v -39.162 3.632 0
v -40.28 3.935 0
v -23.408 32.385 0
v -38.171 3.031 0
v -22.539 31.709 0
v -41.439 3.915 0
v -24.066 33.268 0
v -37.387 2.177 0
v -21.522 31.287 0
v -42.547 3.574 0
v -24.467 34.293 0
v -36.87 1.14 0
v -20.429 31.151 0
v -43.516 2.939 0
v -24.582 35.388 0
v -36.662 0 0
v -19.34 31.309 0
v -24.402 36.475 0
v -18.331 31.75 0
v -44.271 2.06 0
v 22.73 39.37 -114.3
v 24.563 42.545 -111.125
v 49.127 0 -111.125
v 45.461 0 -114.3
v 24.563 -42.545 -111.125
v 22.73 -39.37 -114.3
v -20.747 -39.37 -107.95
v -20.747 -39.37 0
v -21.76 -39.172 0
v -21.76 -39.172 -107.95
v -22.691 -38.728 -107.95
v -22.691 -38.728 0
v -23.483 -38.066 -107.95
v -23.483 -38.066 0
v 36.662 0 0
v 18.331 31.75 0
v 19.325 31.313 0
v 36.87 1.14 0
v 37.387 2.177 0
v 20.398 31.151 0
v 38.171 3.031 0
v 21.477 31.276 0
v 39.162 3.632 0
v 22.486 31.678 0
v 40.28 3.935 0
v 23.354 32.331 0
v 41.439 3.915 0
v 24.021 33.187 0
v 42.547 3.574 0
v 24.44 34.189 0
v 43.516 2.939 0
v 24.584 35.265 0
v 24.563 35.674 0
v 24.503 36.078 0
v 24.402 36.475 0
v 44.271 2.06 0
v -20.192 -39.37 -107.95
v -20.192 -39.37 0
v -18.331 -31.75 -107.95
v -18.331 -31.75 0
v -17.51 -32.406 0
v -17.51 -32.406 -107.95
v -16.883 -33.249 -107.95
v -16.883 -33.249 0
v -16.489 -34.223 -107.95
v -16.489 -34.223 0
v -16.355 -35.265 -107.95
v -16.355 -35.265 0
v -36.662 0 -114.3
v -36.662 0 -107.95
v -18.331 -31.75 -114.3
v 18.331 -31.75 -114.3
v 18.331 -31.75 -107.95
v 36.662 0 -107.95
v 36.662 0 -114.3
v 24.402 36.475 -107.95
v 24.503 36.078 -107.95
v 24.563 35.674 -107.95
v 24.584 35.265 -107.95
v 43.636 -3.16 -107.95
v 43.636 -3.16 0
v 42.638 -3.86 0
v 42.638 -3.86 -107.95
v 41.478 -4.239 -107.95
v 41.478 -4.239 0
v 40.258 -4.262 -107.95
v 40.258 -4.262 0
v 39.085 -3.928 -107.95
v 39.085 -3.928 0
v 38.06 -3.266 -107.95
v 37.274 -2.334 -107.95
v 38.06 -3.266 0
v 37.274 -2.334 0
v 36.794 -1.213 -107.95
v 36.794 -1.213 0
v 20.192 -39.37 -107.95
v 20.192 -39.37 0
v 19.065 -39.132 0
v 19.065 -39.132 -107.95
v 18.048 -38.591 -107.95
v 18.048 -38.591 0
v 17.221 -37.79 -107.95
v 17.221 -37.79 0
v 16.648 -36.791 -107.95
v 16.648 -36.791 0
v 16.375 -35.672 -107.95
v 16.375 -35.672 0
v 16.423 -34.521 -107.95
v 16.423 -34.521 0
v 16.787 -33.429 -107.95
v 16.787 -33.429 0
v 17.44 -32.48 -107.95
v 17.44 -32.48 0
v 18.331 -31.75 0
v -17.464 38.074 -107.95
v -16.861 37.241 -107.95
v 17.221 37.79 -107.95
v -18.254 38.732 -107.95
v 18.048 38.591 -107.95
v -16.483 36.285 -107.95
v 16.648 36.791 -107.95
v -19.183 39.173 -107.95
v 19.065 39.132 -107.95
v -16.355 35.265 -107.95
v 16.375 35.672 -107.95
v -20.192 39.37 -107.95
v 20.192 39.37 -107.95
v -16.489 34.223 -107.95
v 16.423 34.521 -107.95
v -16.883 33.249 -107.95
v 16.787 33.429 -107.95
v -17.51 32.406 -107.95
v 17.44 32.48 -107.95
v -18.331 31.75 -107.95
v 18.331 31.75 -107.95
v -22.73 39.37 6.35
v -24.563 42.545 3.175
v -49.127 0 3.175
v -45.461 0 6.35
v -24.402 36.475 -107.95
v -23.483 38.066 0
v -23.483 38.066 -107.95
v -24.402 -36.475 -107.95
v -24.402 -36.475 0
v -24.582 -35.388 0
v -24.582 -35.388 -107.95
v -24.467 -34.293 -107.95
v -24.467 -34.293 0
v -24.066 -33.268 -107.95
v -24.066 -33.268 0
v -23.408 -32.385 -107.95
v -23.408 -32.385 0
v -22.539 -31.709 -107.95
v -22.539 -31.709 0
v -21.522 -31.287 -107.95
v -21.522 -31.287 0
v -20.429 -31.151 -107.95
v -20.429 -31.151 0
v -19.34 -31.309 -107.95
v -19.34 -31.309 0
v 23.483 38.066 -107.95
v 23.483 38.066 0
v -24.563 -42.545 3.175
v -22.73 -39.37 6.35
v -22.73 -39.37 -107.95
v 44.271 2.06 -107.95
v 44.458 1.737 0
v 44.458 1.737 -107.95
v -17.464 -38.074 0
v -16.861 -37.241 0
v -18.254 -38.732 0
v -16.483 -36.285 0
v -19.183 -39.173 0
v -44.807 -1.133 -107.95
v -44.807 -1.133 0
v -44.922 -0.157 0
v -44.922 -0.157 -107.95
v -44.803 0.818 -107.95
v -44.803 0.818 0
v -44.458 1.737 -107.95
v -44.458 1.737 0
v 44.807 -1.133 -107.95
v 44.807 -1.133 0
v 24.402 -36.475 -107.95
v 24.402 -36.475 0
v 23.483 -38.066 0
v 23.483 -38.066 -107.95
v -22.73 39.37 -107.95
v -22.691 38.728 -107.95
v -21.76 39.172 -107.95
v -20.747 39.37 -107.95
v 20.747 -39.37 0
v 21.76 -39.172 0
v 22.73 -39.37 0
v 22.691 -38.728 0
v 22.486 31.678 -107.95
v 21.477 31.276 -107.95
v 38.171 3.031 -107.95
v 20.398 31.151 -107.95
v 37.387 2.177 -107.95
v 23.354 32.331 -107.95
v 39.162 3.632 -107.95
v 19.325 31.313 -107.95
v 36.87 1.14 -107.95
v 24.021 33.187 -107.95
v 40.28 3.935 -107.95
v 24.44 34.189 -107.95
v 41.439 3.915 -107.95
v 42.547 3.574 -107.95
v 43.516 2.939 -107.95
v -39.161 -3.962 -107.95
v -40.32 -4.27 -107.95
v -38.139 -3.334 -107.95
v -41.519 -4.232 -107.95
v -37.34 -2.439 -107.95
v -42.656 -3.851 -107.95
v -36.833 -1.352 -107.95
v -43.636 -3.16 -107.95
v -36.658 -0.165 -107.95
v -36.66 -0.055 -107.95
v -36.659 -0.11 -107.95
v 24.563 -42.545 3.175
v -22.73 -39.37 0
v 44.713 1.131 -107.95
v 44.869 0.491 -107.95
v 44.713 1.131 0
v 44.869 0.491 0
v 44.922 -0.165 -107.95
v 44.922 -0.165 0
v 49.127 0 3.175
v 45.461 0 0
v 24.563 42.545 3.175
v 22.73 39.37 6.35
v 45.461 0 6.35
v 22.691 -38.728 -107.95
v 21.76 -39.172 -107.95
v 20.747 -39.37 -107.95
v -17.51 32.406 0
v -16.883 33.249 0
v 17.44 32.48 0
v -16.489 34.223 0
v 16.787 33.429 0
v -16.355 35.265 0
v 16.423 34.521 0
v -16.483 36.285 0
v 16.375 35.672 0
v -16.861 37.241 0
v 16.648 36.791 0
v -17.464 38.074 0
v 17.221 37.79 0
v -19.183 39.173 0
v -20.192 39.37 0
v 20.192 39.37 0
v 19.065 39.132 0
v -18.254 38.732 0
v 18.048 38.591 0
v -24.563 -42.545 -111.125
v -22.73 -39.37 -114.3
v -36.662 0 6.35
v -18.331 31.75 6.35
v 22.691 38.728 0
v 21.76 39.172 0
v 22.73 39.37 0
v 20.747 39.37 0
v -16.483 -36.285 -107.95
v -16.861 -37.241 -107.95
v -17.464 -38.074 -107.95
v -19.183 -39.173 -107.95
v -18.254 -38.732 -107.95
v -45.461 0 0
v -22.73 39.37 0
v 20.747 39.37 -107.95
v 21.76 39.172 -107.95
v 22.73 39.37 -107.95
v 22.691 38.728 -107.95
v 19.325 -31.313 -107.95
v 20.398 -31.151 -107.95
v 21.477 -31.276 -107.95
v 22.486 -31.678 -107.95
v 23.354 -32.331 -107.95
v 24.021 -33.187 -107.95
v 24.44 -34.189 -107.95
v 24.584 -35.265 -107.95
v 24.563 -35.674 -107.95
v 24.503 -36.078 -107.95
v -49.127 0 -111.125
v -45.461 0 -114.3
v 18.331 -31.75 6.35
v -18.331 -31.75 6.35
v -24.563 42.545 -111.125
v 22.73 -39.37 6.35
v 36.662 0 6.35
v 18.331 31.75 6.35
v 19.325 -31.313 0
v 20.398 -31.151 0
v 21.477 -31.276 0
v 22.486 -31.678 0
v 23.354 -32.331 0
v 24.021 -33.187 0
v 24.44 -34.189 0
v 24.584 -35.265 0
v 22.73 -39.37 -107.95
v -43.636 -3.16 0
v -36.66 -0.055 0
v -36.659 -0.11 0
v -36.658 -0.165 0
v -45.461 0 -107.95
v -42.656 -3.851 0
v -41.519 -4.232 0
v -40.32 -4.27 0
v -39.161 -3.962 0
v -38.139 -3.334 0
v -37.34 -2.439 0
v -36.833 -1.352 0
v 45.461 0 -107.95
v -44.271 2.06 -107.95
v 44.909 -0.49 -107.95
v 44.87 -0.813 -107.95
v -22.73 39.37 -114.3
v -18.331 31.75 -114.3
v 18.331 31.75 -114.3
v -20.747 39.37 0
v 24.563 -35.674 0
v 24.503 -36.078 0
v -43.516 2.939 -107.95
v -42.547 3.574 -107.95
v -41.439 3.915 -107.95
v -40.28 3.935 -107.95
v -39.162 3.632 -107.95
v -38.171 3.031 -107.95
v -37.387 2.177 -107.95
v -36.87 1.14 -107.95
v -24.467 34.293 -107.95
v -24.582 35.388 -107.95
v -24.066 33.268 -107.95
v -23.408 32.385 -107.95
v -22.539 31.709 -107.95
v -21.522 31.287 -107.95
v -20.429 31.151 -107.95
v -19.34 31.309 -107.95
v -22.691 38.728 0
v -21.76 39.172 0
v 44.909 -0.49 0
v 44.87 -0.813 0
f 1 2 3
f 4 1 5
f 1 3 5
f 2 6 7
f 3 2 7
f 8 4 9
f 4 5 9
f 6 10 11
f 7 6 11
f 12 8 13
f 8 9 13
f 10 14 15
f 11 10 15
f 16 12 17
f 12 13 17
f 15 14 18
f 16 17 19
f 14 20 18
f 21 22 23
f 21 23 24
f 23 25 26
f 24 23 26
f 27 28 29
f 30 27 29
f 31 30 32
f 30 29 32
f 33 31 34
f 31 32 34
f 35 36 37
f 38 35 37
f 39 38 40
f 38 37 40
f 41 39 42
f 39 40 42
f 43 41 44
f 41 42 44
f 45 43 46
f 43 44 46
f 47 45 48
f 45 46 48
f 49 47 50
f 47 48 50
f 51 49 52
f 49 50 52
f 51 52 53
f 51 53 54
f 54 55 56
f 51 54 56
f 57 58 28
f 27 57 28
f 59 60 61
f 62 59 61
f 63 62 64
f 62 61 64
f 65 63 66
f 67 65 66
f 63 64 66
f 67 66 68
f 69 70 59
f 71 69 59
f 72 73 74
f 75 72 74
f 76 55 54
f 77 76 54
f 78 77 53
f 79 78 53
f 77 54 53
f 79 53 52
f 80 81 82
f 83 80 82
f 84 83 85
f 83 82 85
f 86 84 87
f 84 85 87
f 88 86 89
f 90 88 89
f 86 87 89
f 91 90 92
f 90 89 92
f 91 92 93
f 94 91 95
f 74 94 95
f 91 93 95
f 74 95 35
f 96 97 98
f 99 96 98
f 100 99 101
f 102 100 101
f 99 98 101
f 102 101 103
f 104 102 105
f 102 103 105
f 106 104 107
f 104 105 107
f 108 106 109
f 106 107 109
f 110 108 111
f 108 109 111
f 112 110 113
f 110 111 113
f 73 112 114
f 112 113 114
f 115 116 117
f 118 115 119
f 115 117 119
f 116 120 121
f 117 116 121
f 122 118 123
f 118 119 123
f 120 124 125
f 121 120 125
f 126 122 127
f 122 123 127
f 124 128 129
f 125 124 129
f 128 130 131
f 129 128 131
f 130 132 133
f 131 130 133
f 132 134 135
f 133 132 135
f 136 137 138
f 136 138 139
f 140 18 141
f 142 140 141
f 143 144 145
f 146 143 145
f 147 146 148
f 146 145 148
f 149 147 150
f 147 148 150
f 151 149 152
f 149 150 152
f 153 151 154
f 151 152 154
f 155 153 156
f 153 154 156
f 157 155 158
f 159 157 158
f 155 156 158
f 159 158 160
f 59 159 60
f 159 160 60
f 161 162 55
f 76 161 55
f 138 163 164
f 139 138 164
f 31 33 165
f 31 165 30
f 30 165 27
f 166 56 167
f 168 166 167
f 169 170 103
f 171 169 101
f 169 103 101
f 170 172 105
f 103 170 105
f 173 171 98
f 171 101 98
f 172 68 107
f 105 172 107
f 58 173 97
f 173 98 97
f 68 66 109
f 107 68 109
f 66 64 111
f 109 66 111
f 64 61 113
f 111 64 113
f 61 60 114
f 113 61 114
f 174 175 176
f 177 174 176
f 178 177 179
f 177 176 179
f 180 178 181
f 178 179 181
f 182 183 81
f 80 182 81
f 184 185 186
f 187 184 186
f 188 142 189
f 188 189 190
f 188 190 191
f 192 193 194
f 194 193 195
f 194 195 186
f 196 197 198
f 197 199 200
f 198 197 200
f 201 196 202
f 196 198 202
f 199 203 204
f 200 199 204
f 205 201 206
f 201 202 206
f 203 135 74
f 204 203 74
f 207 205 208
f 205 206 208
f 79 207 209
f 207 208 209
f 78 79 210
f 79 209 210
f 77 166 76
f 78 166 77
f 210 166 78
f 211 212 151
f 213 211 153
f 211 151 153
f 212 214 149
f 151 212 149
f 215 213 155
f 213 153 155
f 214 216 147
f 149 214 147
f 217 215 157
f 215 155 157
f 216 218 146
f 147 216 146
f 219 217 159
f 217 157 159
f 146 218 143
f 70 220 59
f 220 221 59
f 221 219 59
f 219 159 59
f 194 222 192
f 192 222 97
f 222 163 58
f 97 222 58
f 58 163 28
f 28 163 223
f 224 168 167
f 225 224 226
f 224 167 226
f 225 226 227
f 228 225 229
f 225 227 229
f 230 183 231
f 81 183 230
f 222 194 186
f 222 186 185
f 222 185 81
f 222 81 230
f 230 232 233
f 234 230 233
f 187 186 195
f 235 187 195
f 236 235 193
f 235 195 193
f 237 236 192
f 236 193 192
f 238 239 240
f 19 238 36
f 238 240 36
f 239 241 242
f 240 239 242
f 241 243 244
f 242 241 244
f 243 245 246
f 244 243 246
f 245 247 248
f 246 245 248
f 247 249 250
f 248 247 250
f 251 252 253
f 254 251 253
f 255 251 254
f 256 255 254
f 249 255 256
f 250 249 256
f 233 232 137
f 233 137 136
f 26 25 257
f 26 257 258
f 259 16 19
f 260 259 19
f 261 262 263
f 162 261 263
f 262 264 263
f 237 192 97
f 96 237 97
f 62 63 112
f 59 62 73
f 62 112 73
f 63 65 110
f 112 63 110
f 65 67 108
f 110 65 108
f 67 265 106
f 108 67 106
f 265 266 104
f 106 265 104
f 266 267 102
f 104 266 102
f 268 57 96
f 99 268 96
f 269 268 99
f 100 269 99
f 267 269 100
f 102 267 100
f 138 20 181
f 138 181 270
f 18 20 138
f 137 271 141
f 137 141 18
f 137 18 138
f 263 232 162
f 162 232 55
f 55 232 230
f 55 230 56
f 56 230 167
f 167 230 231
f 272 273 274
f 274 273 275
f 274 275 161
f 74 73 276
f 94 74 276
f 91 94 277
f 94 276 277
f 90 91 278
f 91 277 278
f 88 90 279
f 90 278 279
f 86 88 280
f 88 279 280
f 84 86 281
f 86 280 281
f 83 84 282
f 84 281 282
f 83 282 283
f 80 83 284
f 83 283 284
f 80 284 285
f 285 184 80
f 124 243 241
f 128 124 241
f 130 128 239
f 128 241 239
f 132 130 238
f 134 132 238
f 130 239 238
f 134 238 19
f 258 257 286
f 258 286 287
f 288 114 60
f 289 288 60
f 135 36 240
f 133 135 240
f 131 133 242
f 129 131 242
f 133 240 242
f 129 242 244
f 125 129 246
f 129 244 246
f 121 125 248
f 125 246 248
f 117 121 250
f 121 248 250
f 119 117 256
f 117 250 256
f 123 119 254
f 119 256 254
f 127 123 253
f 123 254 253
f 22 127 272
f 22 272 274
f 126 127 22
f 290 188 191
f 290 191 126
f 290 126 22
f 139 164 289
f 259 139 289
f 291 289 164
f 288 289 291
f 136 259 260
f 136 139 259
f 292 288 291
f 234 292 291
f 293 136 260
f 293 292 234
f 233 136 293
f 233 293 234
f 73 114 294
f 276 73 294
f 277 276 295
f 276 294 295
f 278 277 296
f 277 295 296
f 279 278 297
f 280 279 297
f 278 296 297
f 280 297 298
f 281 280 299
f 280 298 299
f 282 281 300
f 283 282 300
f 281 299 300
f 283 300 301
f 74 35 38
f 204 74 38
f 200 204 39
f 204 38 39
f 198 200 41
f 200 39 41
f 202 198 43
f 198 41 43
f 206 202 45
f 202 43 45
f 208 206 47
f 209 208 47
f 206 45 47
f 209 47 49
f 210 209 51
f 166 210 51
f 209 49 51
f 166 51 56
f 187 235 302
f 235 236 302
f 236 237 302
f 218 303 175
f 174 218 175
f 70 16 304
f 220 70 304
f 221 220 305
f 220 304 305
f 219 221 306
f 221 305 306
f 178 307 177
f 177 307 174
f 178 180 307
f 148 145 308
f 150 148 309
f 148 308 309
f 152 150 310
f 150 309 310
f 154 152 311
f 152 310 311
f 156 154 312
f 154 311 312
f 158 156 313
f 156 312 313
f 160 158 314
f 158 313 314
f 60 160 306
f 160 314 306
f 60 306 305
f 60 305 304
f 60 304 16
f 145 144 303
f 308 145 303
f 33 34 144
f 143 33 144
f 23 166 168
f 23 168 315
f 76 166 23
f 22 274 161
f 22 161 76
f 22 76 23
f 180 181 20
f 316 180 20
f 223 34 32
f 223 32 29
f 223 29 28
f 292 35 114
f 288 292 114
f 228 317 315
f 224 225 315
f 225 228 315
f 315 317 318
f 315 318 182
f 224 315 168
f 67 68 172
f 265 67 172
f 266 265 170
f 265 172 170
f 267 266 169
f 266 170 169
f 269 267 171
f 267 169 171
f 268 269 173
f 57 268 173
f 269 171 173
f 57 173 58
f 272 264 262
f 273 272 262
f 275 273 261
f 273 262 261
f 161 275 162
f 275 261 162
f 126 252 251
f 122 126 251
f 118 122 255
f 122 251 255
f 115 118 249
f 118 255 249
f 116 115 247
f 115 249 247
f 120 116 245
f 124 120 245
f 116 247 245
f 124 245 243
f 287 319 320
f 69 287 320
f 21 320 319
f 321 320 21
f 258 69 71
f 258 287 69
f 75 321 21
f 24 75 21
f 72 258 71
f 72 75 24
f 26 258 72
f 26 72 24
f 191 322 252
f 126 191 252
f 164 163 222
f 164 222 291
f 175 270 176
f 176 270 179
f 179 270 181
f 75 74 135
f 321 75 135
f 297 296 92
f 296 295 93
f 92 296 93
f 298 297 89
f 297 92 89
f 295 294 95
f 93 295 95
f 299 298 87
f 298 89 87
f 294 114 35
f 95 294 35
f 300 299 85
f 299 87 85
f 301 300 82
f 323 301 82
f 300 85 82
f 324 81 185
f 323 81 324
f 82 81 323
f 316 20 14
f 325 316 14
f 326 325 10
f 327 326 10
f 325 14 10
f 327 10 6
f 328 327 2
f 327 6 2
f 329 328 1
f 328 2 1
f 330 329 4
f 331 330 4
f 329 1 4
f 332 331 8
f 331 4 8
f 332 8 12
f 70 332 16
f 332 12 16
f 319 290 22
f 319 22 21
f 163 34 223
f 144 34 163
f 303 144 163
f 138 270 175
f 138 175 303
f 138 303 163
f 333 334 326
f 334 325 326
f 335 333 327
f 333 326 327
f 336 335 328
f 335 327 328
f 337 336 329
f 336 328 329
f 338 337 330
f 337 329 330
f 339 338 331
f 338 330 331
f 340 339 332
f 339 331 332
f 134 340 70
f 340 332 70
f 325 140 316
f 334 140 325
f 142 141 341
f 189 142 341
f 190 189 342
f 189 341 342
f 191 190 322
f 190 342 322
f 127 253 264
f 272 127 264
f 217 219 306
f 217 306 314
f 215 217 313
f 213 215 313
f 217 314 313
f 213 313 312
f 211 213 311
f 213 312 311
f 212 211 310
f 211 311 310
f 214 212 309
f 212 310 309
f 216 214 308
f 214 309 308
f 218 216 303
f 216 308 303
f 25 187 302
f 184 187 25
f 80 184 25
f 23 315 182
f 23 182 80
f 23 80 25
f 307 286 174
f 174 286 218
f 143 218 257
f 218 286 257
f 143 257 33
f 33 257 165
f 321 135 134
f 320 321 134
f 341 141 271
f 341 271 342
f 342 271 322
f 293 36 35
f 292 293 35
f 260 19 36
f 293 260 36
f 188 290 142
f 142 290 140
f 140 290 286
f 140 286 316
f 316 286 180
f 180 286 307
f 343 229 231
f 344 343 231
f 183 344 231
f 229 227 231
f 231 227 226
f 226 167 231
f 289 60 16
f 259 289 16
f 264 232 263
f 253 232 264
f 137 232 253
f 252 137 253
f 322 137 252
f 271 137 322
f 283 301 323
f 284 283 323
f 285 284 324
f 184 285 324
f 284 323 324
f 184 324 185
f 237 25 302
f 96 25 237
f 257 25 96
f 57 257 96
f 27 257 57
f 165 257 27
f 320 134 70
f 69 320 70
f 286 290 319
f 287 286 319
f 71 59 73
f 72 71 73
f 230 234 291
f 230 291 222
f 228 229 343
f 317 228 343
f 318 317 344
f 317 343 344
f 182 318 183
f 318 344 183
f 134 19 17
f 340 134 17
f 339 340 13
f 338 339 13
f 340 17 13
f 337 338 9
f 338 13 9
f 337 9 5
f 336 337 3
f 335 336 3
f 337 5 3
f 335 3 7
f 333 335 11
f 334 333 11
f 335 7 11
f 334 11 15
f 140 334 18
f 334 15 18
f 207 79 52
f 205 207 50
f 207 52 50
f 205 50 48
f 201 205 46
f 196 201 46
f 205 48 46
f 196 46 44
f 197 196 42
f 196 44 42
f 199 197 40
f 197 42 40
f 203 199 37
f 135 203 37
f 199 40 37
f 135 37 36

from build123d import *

# Parameters (mm, degrees)
F1_DEPTH     = 6.35
F2_T1_DEPTH  = 77.4547380887
F3_T1_DEPTH  = 71.5888593537
F4_T1_DEPTH  = 71.5888593537
F5_T1_DEPTH  = 71.5888593537
F6_T1_DEPTH  = 71.5888593537
F7_T1_DEPTH  = 65.7229806188
F11_DEPTH    = 6.35
F12_T1_DEPTH = 77.4547380887
F13_T1_DEPTH = 71.5888593537
F14_T1_DEPTH = 71.5888593537
F15_T1_DEPTH = 71.5888593537
F16_T1_DEPTH = 71.5888593537
F17_T1_DEPTH = 65.7229806188
F18_DEPTH    = 107.95


# Not quite as in the source:
# - a fillet or chamfer that OpenCascade refuses, or shapes differently, is made with other operations: its cross-section is extruded or revolved along the edge and cut away or added


with BuildPart() as f1:
    # F0 (on Top) → F1 (new body)
    with BuildSketch(Plane.XY):
        Polygon((25.6632194655, 44.45), (-25.6632194655, 44.45), (-51.326438931, 0), (-25.6632194655, -44.45), (25.6632194655, -44.45), (51.326438931, 0), align=None)
        Polygon((-36.6617420935, 0), (-18.3308710468, 31.75), (18.3308710468, 31.75), (36.6617420935, 0), (18.3308710468, -31.75), (-18.3308710468, -31.75), align=None, mode=Mode.SUBTRACT)
    extrude(amount=F1_DEPTH)

    # F2: chamfer of 5.08 on 2 edges, made by hand

    # F2_s2 → F2_t1 (cut)
    with BuildSketch(Plane.YZ.offset(-38.7273690443)):
        Polygon((-44.45, 5.08), (-39.37, 0), (-44.45, 0), align=None)
        Polygon((-44.45, 1.27), (-39.37, 6.35), (-44.45, 6.35), align=None)
    extrude(amount=F2_T1_DEPTH, mode=Mode.SUBTRACT)

    # F3: chamfer of 5.08 on 2 edges, made by hand

    # F3_s2 → F3_t1 (cut)
    with BuildSketch(Plane(origin=(-16.4307451547, -28.4588854141, 0), x_dir=(0, 0, 1), z_dir=(0.5, 0.8660254038, 0))):
        Polygon((0, 39.37), (5.08, 44.45), (0, 44.45), align=None)
        Polygon((6.35, 39.37), (1.27, 44.45), (6.35, 44.45), align=None)
    extrude(amount=F3_T1_DEPTH, mode=Mode.SUBTRACT)

    # F4: chamfer of 5.08 on 2 edges, made by hand

    # F4_s2 → F4_t1 (cut)
    with BuildSketch(Plane(origin=(16.4307451547, -28.4588854141, 0), x_dir=(0, 0, 1), z_dir=(-0.5, 0.8660254038, 0))):
        Polygon((5.08, 44.45), (0, 39.37), (0, 44.45), align=None)
        Polygon((1.27, 44.45), (6.35, 39.37), (6.35, 44.45), align=None)
    extrude(amount=F4_T1_DEPTH, mode=Mode.SUBTRACT)

    # F5: chamfer of 5.08 on 2 edges, made by hand

    # F5_s2 → F5_t1 (cut)
    with BuildSketch(Plane.YZ.offset(-38.7273690443)):
        Polygon((44.45, 5.08), (39.37, 0), (44.45, 0), align=None)
        Polygon((44.45, 1.27), (39.37, 6.35), (44.45, 6.35), align=None)
    extrude(amount=F5_T1_DEPTH, mode=Mode.SUBTRACT)

    # F6: chamfer of 5.08 on 2 edges, made by hand

    # F6_s2 → F6_t1 (cut)
    with BuildSketch(Plane(origin=(16.4307451547, 28.4588854141, 0), x_dir=(0, 0, 1), z_dir=(-0.5, -0.8660254038, 0))):
        Polygon((0, 39.37), (5.08, 44.45), (0, 44.45), align=None)
        Polygon((1.27, 44.45), (6.35, 39.37), (6.35, 44.45), align=None)
    extrude(amount=F6_T1_DEPTH, mode=Mode.SUBTRACT)

    # F7: chamfer of 5.08 on 2 edges, made by hand

    # F7_s2 → F7_t1 (cut)
    with BuildSketch(Plane(origin=(-16.4307451547, 28.4588854141, 0), x_dir=(0, 0, 1), z_dir=(0.5, -0.8660254038, 0))):
        Polygon((0, 39.37), (5.08, 44.45), (0, 44.45), align=None)
        Polygon((1.27, 44.45), (6.35, 39.37), (6.35, 44.45), align=None)
    extrude(amount=F7_T1_DEPTH, mode=Mode.SUBTRACT)



with BuildPart() as f11:
    # F10 (on offset) → F11 (new body)
    with BuildSketch(Plane(origin=(0, 0, -107.95), x_dir=(1, 0, 0), z_dir=(0, 0, -1))):
        Polygon((25.6632194655, 44.45), (-25.6632194655, 44.45), (-51.326438931, 0), (-25.6632194655, -44.45), (25.6632194655, -44.45), (51.326438931, 0), align=None)
        Polygon((-36.6617420935, 0), (-18.3308710468, 31.75), (18.3308710468, 31.75), (36.6617420935, 0), (18.3308710468, -31.75), (-18.3308710468, -31.75), align=None, mode=Mode.SUBTRACT)
    extrude(amount=F11_DEPTH)

    # F12: chamfer of 5.08 on 2 edges, made by hand

    # F12_s2 → F12_t1 (cut)
    with BuildSketch(Plane(origin=(-19.3636845222, -33.5388854141, 0), x_dir=(0, 0, 1), z_dir=(0.5, 0.8660254038, 0))):
        Polygon((-109.22, -44.45), (-114.3, -39.37), (-114.3, -44.45), align=None)
        Polygon((-113.03, -44.45), (-107.95, -39.37), (-107.95, -44.45), align=None)
    extrude(amount=F12_T1_DEPTH, mode=Mode.SUBTRACT)

    # F13: chamfer of 5.08 on 2 edges, made by hand

    # F13_s2 → F13_t1 (cut)
    with BuildSketch(Plane(origin=(19.3636845222, -33.5388854141, 0), x_dir=(0, 0, 1), z_dir=(-0.5, 0.8660254038, 0))):
        Polygon((-109.22, -44.45), (-114.3, -39.37), (-114.3, -44.45), align=None)
        Polygon((-113.03, -44.45), (-107.95, -39.37), (-107.95, -44.45), align=None)
    extrude(amount=F13_T1_DEPTH, mode=Mode.SUBTRACT)

    # F14: chamfer of 5.08 on 2 edges, made by hand

    # F14_s2 → F14_t1 (cut)
    with BuildSketch(Plane.YZ.offset(-32.8614903094)):
        Polygon((-44.45, -113.03), (-39.37, -107.95), (-44.45, -107.95), align=None)
        Polygon((-44.45, -109.22), (-39.37, -114.3), (-44.45, -114.3), align=None)
    extrude(amount=F14_T1_DEPTH, mode=Mode.SUBTRACT)

    # F15: chamfer of 5.08 on 2 edges, made by hand

    # F15_s2 → F15_t1 (cut)
    with BuildSketch(Plane(origin=(19.3636845222, 33.5388854141, 0), x_dir=(0, 0, 1), z_dir=(-0.5, -0.8660254038, 0))):
        Polygon((-107.95, -39.37), (-113.03, -44.45), (-107.95, -44.45), align=None)
        Polygon((-109.22, -44.45), (-114.3, -39.37), (-114.3, -44.45), align=None)
    extrude(amount=F15_T1_DEPTH, mode=Mode.SUBTRACT)

    # F16: chamfer of 5.08 on 2 edges, made by hand

    # F16_s2 → F16_t1 (cut)
    with BuildSketch(Plane(origin=(-19.3636845222, 33.5388854141, 0), x_dir=(0, 0, 1), z_dir=(0.5, -0.8660254038, 0))):
        Polygon((-107.95, -39.37), (-113.03, -44.45), (-107.95, -44.45), align=None)
        Polygon((-109.22, -44.45), (-114.3, -39.37), (-114.3, -44.45), align=None)
    extrude(amount=F16_T1_DEPTH, mode=Mode.SUBTRACT)

    # F17: chamfer of 5.08 on 2 edges, made by hand

    # F17_s2 → F17_t1 (cut)
    with BuildSketch(Plane.YZ.offset(-32.8614903094)):
        Polygon((39.37, -107.95), (44.45, -113.03), (44.45, -107.95), align=None)
        Polygon((44.45, -109.22), (39.37, -114.3), (44.45, -114.3), align=None)
    extrude(amount=F17_T1_DEPTH, mode=Mode.SUBTRACT)


with BuildPart() as f1_1:
    add(f1.part)

    add(f11.part)  # F18 merges F11
    # F8 (on face) → F18 (join)
    with BuildSketch(Plane(origin=(0, 0, 0), x_dir=(1, 0, 0), z_dir=(0, 0, -1))):
        with BuildLine():
            ThreePointArc((-24.4019218999, 36.4746314671), (-22.996261449, 32.0179739378), (-18.3308710468, 31.75))
            ThreePointArc((-18.3308710468, 31.75), (-16.8828037041, 33.2488412093), (-16.3549710973, 35.2649802766))
            ThreePointArc((-16.3549710973, 35.2649802766), (-17.4635050287, 38.0744368309), (-20.1917663217, 39.37))
            Line((-20.1917663217, 39.37), (-20.7469664852, 39.37))
            ThreePointArc((-20.7469664852, 39.37), (-22.2395757858, 38.9790895208), (-23.4832328124, 38.065847643))
            Line((-23.4832328124, 38.065847643), (-24.4019218999, 36.4746314671))
        make_face()
        with BuildLine():
            ThreePointArc((-44.2711808809, -2.0600654032), (-39.7103407865, -3.8229800416), (-36.6617420935, 0))
            ThreePointArc((-36.6617420935, 0), (-36.6592700651, 0.0824842573), (-36.6584459461, 0.165001434))
            ThreePointArc((-36.6584459461, 0.165001434), (-39.1605946831, 3.9616727057), (-43.6363324768, 3.1596550942))
            Line((-43.6363324768, 3.1596550942), (-44.8066059423, 1.1326819932))
            ThreePointArc((-44.8066059423, 1.1326819932), (-44.8913049977, -0.3338212735), (-44.4575484053, -1.7372673821))
            Line((-44.4575484053, -1.7372673821), (-44.2711808809, -2.0600654032))
        make_face()
        with BuildLine():
            ThreePointArc((20.1917663217, 39.37), (16.4724326672, 36.2410793716), (18.3308710468, 31.75))
            ThreePointArc((18.3308710468, 31.75), (22.4855054708, 31.6784175772), (24.5837617096, 35.2649802766))
            ThreePointArc((24.5837617096, 35.2649802766), (24.5380477999, 35.8766014255), (24.4019218999, 36.4746314671))
            Line((24.4019218999, 36.4746314671), (23.4832328124, 38.065847643))
            ThreePointArc((23.4832328124, 38.065847643), (22.2395757858, 38.9790895208), (20.7469664852, 39.37))
            Line((20.7469664852, 39.37), (20.1917663217, 39.37))
        make_face()
        with BuildLine():
            ThreePointArc((43.6363324768, 3.1596550942), (39.0850907082, 3.9283723543), (36.6617420935, 0))
            ThreePointArc((36.6617420935, 0), (39.7103407865, -3.8229800416), (44.2711808809, -2.0600654032))
            Line((44.2711808809, -2.0600654032), (44.4575484053, -1.7372673821))
            ThreePointArc((44.4575484053, -1.7372673821), (44.8038576253, -0.8140164387), (44.9215282886, 0.165001434))
            ThreePointArc((44.9215282886, 0.165001434), (44.8926971055, 0.6522418291), (44.8066059423, 1.1326819932))
            Line((44.8066059423, 1.1326819932), (43.6363324768, 3.1596550942))
        make_face()
        with BuildLine():
            ThreePointArc((24.5837617096, -35.2649802766), (22.4855054708, -31.6784175772), (18.3308710468, -31.75))
            ThreePointArc((18.3308710468, -31.75), (16.4724326672, -36.2410793716), (20.1917663217, -39.37))
            Line((20.1917663217, -39.37), (20.7469664852, -39.37))
            ThreePointArc((20.7469664852, -39.37), (22.2395757858, -38.9790895208), (23.4832328124, -38.065847643))
            Line((23.4832328124, -38.065847643), (24.4019218999, -36.4746314671))
            ThreePointArc((24.4019218999, -36.4746314671), (24.5380477999, -35.8766014255), (24.5837617096, -35.2649802766))
        make_face()
        with BuildLine():
            ThreePointArc((-16.3549710973, -35.2649802766), (-16.8828037041, -33.2488412093), (-18.3308710468, -31.75))
            ThreePointArc((-18.3308710468, -31.75), (-22.996261449, -32.0179739378), (-24.4019218999, -36.4746314671))
            Line((-24.4019218999, -36.4746314671), (-23.4832328124, -38.065847643))
            ThreePointArc((-23.4832328124, -38.065847643), (-22.2395757858, -38.9790895208), (-20.7469664852, -39.37))
            Line((-20.7469664852, -39.37), (-20.1917663217, -39.37))
            ThreePointArc((-20.1917663217, -39.37), (-17.4635050287, -38.0744368309), (-16.3549710973, -35.2649802766))
        make_face()
    extrude(amount=F18_DEPTH)


solid = f1_1.part
